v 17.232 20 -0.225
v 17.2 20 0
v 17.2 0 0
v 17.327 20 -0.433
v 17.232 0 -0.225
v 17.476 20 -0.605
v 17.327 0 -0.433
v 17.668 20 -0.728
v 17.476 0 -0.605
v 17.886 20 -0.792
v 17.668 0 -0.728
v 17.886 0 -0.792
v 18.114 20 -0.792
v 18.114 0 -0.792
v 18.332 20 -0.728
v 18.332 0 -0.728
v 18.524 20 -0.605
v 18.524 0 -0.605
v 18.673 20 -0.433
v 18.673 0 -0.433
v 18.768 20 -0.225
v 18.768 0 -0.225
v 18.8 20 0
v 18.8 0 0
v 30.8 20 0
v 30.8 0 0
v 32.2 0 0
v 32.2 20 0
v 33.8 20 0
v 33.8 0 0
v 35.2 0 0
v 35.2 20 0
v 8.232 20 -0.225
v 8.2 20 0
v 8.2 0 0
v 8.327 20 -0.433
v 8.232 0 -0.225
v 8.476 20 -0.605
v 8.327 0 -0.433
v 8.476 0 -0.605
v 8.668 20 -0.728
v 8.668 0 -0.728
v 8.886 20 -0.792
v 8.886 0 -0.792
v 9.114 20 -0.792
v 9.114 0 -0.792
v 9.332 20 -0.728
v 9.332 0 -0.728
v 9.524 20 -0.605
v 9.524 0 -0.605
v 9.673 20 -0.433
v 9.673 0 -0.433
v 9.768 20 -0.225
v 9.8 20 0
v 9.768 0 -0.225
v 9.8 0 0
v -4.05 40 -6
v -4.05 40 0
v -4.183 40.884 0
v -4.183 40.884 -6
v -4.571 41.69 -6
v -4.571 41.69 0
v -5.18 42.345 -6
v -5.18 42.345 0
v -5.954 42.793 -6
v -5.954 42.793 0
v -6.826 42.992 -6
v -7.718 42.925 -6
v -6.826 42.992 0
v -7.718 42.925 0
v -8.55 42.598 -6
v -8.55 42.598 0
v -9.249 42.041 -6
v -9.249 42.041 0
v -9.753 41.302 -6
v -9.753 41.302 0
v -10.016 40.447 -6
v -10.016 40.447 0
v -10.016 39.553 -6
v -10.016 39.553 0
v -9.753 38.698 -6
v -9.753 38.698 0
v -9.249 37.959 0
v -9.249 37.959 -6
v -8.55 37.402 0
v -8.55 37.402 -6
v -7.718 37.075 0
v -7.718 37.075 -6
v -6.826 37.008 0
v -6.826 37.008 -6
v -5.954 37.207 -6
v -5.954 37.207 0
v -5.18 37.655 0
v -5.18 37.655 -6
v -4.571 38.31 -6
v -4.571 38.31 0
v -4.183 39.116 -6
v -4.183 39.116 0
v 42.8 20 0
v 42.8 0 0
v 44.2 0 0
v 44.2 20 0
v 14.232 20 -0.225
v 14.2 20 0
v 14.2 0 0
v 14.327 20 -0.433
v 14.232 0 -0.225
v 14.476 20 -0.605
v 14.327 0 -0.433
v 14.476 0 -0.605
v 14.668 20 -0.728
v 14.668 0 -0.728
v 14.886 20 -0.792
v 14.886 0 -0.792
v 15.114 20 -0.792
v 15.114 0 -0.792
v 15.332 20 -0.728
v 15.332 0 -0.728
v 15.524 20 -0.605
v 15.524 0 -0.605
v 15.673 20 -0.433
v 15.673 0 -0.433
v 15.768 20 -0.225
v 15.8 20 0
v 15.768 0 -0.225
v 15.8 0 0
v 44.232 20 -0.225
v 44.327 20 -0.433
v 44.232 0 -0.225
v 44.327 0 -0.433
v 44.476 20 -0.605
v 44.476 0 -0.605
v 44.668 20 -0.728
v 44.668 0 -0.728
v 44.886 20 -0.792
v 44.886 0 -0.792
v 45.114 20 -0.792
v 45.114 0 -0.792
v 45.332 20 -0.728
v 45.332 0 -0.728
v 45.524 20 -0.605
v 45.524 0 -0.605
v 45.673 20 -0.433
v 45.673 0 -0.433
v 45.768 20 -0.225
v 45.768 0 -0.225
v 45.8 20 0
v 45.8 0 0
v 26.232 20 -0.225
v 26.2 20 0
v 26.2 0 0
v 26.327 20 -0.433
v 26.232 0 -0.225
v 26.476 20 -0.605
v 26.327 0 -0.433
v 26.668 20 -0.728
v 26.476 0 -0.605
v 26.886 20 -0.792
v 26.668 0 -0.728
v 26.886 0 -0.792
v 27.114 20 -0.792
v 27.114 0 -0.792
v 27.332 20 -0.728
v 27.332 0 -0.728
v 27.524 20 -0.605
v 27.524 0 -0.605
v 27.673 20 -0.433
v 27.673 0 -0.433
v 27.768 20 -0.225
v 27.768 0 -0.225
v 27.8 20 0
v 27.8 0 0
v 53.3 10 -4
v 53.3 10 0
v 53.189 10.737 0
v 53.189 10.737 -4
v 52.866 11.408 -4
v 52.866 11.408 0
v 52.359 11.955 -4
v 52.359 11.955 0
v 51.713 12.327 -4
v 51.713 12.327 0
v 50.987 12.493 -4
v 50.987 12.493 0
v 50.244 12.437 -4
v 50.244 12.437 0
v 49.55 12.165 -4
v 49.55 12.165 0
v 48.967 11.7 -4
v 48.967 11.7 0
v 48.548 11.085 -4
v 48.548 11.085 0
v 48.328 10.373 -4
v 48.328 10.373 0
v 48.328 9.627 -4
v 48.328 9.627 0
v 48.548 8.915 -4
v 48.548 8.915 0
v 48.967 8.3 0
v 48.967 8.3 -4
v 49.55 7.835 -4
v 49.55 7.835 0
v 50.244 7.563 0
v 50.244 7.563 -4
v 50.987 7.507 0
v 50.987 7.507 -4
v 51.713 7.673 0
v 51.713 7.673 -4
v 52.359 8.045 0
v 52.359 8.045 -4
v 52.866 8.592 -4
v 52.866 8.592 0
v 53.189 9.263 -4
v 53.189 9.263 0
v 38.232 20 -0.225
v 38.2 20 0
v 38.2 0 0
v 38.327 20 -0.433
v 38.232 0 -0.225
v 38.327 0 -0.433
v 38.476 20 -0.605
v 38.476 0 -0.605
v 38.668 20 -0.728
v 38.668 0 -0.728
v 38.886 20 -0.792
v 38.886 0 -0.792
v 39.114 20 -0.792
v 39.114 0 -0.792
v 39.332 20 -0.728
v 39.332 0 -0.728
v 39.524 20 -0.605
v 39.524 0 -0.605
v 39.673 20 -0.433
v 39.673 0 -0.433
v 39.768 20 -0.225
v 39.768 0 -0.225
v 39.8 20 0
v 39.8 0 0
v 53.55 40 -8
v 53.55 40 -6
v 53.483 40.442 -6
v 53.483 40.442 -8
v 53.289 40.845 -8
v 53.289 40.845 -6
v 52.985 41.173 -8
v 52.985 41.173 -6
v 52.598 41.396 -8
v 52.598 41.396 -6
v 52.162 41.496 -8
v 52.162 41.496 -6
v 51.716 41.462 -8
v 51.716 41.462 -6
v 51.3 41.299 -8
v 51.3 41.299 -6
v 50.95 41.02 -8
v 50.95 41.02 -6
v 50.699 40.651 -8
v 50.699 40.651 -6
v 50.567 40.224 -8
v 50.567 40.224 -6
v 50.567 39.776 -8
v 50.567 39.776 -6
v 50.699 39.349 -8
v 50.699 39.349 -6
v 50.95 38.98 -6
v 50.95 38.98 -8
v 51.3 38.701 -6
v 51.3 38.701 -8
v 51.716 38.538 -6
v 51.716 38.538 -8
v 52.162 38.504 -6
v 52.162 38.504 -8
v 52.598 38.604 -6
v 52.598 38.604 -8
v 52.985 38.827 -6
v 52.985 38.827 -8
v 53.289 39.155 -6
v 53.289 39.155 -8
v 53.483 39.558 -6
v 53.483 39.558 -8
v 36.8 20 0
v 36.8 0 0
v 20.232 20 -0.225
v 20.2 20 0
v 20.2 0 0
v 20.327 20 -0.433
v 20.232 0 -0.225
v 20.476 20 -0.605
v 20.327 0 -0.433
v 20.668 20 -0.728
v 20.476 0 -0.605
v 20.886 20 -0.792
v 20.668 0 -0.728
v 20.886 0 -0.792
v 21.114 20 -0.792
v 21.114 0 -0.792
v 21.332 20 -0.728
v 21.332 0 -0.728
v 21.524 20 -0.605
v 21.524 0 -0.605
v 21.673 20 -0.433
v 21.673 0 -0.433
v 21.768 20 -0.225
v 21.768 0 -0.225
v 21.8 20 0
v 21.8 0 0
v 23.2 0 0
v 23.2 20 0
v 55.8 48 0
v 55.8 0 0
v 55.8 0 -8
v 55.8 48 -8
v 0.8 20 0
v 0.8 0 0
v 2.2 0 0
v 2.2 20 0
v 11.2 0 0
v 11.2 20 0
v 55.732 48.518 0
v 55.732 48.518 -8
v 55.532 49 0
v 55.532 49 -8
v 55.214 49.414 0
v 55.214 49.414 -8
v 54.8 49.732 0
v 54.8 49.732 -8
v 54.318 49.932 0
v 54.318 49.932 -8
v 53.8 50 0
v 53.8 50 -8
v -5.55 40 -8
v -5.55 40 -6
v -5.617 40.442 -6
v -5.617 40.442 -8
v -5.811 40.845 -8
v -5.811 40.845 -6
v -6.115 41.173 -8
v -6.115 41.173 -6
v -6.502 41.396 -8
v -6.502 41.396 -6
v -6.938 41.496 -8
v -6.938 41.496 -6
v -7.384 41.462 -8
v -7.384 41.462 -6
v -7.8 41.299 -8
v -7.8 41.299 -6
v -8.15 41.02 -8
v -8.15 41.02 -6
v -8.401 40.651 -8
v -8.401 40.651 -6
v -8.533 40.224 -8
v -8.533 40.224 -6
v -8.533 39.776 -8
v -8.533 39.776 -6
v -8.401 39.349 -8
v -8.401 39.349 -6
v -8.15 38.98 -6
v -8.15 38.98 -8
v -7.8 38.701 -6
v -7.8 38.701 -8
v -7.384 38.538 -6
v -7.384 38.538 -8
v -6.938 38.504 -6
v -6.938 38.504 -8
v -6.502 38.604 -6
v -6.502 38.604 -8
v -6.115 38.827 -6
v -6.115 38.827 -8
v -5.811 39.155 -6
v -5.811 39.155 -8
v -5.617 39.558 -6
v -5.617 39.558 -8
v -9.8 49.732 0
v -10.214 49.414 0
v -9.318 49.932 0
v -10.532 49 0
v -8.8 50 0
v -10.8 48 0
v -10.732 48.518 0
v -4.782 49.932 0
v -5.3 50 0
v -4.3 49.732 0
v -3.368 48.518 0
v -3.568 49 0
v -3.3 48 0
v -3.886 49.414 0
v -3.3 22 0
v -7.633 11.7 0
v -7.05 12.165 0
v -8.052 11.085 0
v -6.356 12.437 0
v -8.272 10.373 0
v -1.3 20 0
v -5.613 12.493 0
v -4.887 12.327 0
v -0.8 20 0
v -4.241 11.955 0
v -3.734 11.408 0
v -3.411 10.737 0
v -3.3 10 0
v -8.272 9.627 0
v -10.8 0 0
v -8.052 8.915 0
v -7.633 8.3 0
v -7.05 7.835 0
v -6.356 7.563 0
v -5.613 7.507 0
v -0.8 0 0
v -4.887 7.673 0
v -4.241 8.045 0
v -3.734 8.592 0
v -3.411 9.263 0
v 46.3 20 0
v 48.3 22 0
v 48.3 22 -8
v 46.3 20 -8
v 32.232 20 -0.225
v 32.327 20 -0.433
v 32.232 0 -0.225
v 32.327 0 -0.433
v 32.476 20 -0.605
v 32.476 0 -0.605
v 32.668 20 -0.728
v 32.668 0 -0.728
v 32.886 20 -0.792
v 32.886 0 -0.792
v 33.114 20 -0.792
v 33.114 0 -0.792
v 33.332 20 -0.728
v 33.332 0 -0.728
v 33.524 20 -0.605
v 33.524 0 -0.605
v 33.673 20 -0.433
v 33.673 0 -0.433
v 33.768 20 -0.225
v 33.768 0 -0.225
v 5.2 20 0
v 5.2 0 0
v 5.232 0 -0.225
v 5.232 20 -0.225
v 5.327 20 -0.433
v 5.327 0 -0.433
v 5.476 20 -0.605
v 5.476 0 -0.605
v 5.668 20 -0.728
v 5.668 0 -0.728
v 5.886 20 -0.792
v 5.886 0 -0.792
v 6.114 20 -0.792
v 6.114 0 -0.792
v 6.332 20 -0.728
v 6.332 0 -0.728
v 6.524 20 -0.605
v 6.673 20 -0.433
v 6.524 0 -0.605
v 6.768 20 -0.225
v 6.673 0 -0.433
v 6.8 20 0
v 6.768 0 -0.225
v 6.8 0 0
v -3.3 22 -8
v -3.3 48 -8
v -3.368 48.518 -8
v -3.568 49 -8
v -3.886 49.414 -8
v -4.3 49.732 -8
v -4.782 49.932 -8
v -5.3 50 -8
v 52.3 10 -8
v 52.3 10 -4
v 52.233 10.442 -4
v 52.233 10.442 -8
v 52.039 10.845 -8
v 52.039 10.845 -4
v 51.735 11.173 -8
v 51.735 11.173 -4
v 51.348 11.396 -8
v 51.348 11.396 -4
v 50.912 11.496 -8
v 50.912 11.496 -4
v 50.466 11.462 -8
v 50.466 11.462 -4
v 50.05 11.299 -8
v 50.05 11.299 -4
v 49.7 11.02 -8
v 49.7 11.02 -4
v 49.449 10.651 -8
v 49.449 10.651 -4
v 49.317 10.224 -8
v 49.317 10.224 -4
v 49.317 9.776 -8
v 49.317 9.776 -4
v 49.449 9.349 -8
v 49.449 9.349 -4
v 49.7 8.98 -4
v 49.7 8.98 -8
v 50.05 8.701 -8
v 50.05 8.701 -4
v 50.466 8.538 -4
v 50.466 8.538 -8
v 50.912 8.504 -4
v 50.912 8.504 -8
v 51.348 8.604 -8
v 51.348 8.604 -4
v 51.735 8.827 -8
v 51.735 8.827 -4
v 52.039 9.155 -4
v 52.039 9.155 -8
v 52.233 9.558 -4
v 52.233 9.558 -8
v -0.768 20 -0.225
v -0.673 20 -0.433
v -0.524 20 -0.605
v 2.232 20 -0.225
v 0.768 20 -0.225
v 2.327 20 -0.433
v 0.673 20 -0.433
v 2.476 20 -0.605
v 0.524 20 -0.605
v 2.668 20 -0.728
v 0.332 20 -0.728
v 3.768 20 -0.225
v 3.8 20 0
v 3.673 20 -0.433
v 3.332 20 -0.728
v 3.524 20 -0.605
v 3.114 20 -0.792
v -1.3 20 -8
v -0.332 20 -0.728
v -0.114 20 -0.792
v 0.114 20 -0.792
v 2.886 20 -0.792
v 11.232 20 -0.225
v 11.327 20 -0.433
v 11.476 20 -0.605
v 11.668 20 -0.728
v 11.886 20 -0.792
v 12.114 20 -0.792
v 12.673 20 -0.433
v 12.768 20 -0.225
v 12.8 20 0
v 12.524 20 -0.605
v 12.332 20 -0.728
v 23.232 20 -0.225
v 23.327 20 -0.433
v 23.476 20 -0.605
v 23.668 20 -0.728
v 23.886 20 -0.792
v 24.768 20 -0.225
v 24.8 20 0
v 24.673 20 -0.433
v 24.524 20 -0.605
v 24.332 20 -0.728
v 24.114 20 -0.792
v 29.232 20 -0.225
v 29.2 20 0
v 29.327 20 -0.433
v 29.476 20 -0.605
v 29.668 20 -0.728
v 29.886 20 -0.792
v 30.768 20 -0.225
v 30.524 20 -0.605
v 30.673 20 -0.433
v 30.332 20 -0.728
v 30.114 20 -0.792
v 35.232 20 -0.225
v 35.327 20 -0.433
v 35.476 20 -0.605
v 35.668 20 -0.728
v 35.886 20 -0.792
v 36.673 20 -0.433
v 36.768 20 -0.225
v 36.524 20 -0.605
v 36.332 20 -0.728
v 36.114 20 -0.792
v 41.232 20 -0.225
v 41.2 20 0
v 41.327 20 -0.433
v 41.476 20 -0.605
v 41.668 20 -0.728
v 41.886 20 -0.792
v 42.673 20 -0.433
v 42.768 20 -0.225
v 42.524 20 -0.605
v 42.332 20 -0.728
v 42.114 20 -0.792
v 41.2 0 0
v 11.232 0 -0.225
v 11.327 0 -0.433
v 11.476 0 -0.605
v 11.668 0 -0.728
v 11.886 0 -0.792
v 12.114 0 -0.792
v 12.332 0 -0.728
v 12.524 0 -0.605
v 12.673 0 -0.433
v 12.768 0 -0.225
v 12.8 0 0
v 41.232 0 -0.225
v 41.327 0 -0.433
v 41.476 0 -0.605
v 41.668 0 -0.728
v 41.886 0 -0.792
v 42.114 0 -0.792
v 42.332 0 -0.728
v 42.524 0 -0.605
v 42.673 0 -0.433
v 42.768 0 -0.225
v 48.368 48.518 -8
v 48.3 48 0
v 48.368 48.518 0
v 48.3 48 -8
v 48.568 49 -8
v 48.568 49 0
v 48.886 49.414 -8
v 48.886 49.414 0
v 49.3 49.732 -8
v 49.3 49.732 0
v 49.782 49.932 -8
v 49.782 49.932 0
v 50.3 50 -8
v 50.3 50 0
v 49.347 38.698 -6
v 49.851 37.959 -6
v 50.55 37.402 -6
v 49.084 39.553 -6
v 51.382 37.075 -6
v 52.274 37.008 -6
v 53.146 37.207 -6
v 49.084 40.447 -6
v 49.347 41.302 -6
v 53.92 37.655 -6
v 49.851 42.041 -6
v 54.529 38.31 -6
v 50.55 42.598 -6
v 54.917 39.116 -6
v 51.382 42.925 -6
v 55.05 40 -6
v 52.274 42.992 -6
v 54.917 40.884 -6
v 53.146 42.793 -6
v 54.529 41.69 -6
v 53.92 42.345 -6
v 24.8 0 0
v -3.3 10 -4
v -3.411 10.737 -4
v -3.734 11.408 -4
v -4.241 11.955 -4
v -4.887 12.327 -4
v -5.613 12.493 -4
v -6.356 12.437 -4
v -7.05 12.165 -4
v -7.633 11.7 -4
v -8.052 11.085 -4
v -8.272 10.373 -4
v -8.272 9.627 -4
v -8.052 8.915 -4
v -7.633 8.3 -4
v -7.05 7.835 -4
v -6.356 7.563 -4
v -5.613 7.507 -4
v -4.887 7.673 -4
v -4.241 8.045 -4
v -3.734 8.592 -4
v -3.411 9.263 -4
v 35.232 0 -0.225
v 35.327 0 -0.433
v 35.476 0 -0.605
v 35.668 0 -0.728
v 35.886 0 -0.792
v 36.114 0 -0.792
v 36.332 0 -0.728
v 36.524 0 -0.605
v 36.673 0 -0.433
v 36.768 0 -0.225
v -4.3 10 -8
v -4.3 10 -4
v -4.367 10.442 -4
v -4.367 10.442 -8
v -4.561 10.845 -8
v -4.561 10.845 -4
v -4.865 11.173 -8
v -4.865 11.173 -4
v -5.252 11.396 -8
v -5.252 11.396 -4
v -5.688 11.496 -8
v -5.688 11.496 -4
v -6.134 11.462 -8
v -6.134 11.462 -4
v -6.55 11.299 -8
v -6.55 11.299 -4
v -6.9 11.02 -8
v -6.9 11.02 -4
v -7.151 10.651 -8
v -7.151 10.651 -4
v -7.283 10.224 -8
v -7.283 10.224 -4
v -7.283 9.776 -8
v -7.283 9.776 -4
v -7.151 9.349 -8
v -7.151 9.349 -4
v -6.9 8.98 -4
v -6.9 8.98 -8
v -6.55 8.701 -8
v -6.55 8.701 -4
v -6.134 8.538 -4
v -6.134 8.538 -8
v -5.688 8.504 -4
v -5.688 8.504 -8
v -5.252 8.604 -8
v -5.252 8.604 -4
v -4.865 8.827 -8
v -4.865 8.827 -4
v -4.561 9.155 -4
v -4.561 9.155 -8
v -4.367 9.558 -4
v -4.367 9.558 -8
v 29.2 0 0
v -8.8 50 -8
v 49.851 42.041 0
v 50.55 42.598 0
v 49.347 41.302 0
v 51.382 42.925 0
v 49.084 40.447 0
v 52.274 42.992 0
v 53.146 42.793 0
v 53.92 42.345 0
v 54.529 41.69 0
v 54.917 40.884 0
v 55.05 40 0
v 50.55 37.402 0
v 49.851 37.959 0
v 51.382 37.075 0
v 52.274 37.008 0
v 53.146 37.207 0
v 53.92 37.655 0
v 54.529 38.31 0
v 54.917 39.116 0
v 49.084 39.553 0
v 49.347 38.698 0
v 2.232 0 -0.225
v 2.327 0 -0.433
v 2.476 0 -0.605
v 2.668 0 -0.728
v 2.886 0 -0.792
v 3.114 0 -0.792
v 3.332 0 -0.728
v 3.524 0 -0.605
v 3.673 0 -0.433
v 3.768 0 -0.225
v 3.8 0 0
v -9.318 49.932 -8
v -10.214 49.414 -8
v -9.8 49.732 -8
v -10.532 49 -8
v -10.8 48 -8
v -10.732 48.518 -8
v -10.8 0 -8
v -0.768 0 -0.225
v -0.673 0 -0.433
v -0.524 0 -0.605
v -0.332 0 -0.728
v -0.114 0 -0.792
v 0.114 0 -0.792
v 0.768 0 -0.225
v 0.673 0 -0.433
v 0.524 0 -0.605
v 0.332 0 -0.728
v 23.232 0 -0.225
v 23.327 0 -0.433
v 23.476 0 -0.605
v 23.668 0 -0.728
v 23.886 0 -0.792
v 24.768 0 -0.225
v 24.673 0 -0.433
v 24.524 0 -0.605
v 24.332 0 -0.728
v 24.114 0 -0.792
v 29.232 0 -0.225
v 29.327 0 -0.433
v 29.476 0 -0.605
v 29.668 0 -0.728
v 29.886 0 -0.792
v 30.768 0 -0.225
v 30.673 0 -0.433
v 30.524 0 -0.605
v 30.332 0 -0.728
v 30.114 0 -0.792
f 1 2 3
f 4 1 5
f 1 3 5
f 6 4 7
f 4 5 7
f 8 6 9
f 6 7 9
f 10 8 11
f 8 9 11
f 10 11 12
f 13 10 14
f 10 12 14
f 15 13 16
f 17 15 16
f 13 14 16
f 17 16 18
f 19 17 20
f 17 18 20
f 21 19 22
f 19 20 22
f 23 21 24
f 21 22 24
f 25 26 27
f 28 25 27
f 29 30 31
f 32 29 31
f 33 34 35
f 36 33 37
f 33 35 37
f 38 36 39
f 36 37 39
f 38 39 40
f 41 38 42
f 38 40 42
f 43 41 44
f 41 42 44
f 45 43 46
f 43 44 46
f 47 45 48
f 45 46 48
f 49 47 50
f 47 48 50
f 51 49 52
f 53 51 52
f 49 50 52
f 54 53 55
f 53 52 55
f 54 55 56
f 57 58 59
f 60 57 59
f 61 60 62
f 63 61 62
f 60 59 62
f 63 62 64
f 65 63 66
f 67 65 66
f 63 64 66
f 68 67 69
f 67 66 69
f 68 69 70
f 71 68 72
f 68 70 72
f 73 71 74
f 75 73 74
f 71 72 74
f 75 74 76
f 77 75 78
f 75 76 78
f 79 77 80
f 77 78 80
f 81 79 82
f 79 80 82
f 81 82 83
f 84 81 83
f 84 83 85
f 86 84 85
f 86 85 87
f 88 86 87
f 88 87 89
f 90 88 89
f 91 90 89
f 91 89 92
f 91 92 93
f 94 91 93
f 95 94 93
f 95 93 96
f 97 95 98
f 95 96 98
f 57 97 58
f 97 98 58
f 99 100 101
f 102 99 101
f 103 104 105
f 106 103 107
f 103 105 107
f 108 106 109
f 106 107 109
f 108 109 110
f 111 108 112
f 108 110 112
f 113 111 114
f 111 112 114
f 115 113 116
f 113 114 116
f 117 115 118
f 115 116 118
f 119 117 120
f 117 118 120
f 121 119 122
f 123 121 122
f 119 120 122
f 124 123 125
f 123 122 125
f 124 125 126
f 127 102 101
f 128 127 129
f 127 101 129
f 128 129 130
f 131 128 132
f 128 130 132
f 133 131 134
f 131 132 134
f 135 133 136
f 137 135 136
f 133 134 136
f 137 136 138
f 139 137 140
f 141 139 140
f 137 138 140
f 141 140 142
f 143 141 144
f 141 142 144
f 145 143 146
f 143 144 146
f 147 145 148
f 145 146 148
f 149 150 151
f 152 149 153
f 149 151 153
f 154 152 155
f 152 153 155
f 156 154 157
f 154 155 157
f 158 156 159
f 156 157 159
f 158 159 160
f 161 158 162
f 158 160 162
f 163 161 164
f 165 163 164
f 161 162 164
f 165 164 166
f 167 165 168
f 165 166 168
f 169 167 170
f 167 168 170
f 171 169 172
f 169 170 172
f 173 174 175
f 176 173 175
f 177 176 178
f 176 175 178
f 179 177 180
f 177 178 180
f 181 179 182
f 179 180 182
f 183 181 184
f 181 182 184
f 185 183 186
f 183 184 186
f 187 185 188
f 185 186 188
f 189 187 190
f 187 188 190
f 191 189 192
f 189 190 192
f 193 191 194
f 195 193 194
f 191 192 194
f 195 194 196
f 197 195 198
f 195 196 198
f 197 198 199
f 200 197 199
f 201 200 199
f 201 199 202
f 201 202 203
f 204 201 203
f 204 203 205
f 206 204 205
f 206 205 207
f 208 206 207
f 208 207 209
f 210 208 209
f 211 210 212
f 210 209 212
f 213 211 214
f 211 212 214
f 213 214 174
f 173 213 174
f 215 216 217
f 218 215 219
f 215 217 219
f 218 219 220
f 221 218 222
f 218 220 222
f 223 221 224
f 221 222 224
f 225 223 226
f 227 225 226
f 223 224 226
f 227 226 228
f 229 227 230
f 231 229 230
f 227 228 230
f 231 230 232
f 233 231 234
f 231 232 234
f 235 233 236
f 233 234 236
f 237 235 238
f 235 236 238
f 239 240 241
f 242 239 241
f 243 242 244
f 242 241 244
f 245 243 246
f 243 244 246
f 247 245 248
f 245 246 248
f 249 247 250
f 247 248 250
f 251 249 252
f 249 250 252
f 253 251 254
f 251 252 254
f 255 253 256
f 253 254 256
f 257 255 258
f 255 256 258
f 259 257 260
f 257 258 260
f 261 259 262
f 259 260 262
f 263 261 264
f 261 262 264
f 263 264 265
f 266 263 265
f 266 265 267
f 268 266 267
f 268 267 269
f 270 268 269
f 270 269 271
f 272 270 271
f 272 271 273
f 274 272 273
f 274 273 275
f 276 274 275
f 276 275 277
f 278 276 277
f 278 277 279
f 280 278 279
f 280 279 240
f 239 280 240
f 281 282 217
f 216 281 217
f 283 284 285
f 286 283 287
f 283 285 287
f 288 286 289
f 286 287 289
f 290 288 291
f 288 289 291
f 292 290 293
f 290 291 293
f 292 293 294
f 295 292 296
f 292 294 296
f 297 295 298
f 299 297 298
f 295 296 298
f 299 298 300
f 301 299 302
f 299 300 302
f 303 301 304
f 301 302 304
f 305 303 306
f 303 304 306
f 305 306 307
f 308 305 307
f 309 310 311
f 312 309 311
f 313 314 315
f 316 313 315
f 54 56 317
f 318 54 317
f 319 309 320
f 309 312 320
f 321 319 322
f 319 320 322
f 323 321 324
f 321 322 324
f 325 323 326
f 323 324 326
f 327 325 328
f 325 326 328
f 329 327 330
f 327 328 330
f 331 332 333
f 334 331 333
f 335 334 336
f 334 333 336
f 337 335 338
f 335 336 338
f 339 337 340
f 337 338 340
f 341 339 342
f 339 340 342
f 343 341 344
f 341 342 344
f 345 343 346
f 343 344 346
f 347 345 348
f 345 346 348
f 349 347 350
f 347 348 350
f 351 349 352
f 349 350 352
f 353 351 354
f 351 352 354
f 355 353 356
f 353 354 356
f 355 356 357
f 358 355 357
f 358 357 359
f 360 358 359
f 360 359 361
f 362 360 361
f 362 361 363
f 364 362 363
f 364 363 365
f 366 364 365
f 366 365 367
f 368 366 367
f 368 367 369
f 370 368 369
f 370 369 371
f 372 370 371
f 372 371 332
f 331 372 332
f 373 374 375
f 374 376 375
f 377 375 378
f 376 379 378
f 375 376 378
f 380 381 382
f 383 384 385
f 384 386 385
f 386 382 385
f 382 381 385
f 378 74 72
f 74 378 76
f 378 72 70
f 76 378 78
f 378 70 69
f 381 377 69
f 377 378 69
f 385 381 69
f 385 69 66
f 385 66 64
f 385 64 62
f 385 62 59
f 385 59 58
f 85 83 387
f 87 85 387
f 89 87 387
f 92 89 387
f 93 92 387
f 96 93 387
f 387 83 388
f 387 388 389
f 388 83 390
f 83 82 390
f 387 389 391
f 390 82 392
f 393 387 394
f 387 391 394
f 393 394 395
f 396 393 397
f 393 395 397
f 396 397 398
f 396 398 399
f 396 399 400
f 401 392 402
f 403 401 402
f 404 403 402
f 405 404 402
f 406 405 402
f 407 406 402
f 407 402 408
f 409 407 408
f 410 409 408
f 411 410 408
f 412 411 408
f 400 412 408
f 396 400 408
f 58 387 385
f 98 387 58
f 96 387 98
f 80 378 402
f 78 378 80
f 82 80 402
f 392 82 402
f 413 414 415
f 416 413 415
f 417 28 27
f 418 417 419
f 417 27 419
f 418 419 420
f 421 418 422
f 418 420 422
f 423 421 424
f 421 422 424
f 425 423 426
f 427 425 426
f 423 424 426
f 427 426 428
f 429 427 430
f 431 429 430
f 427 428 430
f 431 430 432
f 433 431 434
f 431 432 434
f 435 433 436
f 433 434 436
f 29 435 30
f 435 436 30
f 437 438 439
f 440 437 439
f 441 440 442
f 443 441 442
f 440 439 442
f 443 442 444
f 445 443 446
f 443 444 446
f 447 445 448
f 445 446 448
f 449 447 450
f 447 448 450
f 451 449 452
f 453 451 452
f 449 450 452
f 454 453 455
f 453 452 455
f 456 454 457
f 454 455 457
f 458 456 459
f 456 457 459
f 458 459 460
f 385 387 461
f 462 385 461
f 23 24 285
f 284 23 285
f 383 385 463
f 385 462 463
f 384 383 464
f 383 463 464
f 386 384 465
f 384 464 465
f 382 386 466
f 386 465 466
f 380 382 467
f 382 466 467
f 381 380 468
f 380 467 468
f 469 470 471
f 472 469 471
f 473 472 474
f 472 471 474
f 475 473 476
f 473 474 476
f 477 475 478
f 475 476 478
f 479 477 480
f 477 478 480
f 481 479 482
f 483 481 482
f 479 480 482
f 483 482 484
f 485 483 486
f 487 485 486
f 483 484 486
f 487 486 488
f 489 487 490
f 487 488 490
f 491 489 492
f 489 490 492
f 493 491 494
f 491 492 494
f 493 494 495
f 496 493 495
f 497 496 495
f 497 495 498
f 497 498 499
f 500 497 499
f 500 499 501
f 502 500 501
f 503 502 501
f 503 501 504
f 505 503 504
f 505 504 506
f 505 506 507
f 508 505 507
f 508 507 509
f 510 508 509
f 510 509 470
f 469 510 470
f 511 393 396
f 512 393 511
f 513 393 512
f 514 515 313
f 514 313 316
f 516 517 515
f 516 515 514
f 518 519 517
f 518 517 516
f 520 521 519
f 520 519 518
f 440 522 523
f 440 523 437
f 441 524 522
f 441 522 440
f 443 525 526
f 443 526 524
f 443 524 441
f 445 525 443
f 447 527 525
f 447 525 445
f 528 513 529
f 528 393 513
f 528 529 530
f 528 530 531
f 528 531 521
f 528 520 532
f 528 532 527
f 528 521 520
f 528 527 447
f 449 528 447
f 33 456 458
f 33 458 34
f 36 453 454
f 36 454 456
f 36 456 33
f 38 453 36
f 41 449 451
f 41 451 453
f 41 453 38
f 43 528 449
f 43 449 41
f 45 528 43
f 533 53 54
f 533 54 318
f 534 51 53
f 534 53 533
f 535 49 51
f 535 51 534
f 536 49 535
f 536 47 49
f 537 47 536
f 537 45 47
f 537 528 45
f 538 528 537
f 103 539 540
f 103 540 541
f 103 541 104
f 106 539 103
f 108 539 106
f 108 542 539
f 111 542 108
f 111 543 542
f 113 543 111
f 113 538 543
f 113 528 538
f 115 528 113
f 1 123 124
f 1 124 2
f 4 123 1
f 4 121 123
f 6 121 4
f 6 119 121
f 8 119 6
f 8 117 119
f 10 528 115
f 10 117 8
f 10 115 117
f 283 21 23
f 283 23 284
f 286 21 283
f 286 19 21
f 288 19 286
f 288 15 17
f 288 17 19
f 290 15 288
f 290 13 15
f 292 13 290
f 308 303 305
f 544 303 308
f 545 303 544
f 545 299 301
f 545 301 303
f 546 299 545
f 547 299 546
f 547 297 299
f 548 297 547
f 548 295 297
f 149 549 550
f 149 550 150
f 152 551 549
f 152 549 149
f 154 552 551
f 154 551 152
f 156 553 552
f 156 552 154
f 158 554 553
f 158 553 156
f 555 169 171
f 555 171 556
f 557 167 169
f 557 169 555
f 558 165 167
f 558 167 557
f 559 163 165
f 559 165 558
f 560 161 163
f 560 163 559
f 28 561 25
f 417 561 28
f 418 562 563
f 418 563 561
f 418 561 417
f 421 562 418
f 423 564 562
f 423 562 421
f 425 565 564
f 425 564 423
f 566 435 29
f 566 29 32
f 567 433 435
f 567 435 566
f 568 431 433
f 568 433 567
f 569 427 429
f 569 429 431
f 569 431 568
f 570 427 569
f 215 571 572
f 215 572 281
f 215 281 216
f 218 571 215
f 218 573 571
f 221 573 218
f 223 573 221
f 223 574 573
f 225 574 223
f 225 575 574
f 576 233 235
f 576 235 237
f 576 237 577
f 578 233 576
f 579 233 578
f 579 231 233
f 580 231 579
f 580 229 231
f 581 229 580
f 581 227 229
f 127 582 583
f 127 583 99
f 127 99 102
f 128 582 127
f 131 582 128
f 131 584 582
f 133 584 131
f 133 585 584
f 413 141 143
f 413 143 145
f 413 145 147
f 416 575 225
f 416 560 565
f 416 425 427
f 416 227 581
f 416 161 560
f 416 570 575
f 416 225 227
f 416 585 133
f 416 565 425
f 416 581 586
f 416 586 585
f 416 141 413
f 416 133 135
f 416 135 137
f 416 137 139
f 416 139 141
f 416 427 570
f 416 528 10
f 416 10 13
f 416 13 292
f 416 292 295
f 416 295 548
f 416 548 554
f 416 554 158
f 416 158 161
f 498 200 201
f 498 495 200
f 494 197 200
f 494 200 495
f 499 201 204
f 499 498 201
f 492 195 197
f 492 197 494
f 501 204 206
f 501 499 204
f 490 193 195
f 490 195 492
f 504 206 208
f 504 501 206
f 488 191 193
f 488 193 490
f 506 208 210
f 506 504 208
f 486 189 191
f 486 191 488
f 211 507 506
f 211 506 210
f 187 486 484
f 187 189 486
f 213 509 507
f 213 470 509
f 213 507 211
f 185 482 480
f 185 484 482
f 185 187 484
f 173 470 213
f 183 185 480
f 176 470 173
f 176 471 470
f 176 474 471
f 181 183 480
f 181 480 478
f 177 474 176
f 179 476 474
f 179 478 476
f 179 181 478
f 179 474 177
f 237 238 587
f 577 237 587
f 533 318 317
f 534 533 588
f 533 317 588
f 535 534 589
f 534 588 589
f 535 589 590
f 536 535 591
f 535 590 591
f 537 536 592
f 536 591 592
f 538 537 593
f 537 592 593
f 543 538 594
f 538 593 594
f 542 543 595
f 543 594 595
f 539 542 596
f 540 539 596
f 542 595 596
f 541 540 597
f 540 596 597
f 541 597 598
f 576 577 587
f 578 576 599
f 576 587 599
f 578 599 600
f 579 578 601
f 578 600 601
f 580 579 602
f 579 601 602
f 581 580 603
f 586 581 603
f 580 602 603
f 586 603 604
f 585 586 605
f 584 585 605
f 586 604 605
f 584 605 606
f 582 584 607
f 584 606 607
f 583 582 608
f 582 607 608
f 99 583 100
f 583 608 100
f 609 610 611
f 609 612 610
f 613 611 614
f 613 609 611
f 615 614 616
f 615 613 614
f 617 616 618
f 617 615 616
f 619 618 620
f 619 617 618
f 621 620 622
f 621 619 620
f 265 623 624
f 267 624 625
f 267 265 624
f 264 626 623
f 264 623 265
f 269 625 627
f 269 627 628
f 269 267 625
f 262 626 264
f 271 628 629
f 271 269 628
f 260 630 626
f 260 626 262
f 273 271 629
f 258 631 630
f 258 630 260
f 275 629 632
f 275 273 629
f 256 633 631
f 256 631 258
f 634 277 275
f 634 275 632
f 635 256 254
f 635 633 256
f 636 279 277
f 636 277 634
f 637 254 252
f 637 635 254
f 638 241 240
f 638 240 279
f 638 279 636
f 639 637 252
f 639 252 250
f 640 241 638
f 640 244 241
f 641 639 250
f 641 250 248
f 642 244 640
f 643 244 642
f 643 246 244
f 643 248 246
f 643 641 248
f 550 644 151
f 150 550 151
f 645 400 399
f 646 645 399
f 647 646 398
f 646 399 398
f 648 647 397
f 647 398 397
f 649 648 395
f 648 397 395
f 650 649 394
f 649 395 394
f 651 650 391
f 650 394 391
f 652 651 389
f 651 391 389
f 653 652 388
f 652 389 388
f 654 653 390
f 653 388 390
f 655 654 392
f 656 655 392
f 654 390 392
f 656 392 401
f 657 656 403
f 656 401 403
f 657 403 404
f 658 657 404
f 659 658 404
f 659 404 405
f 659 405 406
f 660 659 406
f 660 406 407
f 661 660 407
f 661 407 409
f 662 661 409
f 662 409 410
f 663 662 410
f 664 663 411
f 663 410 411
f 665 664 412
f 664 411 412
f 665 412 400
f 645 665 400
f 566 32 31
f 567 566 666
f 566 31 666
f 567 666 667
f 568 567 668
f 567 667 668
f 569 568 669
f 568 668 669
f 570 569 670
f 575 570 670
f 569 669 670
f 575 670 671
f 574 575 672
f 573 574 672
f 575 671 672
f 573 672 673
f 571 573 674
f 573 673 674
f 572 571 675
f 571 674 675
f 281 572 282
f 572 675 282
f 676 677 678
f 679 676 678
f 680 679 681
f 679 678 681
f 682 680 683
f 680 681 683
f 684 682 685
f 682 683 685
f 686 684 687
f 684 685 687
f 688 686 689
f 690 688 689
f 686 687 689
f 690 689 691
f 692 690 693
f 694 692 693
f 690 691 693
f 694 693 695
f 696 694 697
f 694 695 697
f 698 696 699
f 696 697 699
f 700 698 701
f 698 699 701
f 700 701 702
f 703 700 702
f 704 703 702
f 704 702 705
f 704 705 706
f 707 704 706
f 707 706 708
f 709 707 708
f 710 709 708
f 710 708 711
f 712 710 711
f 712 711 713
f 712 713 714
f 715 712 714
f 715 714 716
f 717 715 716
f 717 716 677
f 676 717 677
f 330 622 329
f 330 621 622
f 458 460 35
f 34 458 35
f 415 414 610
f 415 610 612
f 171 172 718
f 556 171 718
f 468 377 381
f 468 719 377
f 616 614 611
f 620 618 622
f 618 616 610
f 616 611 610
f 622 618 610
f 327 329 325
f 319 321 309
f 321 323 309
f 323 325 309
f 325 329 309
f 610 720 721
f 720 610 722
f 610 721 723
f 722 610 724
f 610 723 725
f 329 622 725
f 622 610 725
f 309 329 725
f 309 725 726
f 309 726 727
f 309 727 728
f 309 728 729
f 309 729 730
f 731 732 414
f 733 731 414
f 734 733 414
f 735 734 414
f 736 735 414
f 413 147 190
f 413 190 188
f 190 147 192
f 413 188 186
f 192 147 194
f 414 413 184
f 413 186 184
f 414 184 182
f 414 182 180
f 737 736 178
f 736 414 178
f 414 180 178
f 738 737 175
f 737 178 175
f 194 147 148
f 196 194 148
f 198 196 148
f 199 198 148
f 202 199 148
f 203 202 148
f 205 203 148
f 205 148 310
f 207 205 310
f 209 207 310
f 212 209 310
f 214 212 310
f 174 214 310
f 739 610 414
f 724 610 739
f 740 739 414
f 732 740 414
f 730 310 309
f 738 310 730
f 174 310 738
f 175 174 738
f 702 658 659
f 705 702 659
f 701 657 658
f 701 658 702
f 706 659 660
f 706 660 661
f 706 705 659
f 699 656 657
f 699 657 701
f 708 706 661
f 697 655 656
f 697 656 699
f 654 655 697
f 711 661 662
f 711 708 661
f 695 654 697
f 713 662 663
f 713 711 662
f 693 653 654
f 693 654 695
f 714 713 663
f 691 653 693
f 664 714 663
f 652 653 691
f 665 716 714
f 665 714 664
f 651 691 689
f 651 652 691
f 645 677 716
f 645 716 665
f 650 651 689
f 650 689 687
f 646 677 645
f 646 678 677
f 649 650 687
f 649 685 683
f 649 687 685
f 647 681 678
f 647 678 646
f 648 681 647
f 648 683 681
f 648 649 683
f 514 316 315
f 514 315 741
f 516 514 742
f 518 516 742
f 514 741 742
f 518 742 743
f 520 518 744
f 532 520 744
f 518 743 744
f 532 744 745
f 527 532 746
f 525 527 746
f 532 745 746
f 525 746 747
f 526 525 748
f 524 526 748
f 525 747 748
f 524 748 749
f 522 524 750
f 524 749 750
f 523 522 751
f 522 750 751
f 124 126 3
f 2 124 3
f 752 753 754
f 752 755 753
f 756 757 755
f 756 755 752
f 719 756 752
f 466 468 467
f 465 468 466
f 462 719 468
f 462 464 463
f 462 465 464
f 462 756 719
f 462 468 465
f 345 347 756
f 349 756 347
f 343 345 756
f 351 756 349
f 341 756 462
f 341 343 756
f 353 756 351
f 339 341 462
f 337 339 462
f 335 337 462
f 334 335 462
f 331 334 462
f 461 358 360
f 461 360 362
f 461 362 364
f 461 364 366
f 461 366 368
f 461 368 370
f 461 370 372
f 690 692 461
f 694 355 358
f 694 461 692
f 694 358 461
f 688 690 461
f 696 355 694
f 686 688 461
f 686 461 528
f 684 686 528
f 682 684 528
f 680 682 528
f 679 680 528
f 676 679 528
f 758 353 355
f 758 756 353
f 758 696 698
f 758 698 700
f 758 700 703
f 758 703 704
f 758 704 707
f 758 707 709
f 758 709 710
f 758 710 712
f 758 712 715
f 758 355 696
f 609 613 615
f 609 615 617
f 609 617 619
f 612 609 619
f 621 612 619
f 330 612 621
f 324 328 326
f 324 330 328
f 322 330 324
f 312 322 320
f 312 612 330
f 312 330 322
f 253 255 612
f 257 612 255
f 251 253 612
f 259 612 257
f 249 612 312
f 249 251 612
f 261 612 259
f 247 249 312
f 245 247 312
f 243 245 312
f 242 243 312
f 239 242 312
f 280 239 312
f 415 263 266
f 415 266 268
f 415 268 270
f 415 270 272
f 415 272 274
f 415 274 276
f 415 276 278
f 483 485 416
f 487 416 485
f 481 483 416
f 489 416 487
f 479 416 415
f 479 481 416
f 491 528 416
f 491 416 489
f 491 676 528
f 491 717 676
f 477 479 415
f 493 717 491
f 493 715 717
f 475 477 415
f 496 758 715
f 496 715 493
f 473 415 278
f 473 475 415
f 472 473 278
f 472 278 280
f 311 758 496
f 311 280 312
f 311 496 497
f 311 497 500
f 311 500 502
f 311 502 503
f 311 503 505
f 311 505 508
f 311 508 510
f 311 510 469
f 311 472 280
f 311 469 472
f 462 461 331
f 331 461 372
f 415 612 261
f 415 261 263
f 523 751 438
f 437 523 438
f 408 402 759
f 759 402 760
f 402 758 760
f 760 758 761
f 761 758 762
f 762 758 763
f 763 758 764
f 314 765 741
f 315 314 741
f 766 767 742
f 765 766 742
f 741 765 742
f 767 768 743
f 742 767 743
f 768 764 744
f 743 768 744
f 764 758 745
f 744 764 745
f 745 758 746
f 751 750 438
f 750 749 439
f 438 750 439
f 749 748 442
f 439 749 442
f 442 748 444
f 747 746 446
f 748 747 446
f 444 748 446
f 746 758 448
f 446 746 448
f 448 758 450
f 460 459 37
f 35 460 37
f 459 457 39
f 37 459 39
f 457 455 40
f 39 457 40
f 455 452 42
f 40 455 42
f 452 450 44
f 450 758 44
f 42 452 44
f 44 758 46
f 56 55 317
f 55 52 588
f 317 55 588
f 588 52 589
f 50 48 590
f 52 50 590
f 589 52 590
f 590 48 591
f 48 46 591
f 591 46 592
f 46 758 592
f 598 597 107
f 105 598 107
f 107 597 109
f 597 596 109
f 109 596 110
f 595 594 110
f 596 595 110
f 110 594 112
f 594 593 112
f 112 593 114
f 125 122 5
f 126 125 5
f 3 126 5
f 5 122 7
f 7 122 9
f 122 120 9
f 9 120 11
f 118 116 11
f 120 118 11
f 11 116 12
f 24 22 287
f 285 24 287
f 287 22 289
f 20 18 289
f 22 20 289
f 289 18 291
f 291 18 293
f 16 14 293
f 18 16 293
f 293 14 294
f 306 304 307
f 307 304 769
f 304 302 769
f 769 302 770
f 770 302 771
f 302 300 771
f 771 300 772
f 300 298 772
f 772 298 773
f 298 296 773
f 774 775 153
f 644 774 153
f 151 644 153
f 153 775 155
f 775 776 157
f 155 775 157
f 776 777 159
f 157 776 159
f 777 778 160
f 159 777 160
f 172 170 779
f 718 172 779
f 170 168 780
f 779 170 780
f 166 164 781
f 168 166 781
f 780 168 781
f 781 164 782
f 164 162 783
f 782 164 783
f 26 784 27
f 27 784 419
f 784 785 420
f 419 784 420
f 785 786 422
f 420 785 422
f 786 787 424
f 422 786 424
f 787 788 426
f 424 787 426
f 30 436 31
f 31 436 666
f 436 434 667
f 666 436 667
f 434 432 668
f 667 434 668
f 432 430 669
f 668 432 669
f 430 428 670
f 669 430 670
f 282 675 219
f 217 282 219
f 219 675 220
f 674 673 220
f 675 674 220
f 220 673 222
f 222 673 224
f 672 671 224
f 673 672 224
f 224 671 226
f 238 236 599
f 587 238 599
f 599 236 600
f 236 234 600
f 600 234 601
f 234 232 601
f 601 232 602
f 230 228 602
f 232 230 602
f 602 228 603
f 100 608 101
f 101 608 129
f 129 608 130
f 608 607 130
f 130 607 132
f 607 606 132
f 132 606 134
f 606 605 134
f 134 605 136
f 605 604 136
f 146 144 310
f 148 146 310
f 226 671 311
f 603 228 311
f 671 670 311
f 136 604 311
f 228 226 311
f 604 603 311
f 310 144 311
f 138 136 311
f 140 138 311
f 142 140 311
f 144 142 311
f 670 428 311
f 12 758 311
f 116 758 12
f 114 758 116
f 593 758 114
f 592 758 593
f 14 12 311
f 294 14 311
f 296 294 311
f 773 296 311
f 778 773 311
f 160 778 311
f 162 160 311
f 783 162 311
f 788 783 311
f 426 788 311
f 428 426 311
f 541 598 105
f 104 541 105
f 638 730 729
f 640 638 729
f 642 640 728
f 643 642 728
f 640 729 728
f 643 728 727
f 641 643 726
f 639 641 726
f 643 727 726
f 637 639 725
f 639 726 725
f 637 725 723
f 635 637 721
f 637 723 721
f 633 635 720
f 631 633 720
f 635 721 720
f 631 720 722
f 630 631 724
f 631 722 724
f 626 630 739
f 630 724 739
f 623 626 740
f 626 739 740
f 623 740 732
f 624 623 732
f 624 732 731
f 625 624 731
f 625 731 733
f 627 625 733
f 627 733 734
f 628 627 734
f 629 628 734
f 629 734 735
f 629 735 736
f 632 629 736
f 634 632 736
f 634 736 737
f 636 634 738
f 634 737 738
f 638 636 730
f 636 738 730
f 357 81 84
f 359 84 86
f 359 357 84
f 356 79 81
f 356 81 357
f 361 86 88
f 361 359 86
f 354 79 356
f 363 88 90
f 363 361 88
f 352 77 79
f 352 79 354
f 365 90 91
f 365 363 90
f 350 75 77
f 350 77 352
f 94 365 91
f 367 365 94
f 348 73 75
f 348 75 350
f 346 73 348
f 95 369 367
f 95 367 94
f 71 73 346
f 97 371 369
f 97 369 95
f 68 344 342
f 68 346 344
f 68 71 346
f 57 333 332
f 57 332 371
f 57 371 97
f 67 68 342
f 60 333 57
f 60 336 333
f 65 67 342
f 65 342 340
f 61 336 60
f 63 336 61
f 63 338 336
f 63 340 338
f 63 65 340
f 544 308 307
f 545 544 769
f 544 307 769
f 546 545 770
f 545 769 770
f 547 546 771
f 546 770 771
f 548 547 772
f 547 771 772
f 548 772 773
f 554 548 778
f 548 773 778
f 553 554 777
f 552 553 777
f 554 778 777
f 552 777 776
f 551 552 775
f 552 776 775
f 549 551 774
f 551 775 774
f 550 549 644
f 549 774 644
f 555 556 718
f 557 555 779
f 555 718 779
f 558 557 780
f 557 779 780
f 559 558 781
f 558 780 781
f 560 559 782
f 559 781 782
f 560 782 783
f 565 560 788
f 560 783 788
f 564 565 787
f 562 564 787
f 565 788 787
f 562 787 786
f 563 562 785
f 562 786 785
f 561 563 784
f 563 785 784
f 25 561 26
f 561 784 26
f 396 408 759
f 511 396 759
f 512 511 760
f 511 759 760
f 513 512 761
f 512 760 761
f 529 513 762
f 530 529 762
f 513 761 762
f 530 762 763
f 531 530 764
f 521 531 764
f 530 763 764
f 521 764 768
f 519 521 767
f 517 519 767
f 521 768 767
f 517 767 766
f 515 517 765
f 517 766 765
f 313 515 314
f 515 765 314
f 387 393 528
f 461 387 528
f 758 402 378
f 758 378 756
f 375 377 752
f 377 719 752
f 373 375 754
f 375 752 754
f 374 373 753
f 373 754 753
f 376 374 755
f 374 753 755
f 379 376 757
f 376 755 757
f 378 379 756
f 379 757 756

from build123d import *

# Parameters (mm, degrees)
EXTRUDE_1_DEPTH     = 20
SKETCH_3_R          = 2.5
CUT_EXTRUDE_1_DEPTH = 4
SKETCH_4_R          = 1.5
CUT_EXTRUDE_2_DEPTH = 14
SKETCH_5_W          = 7.5
SKETCH_5_H          = 8
EXTRUDE_2_DEPTH     = 30
SKETCH_6_R          = 3
CUT_EXTRUDE_3_DEPTH = 6
SKETCH_7_R          = 1.5
CUT_EXTRUDE_4_DEPTH = 6
CHAMFER_1_SIZE      = 2
FILLET_1_R          = 2


with BuildPart() as part:
    # 草图1 → 凸台-拉伸1 (new body)
    with BuildSketch(Plane(origin=(0, 0, 0), x_dir=(1, 0, 0), z_dir=(0, 1, 0))):
        with BuildLine():
            Line((-10.8, 0), (-0.8, 0))
            ThreePointArc((-0.8, 0), (0, 0.8), (0.8, 0))
            Line((0.8, 0), (2.2, 0))
            ThreePointArc((2.2, 0), (3, 0.8), (3.8, 0))
            Line((3.8, 0), (5.2, 0))
            ThreePointArc((5.2, 0), (6, 0.8), (6.8, 0))
            Line((6.8, 0), (8.2, 0))
            ThreePointArc((8.2, 0), (9, 0.8), (9.8, 0))
            Line((9.8, 0), (11.2, 0))
            ThreePointArc((11.2, 0), (12, 0.8), (12.8, 0))
            Line((12.8, 0), (14.2, 0))
            ThreePointArc((14.2, 0), (15, 0.8), (15.8, 0))
            Line((15.8, 0), (17.2, 0))
            ThreePointArc((17.2, 0), (18, 0.8), (18.8, 0))
            Line((18.8, 0), (20.2, 0))
            ThreePointArc((20.2, 0), (21, 0.8), (21.8, 0))
            Line((21.8, 0), (23.2, 0))
            ThreePointArc((23.2, 0), (24, 0.8), (24.8, 0))
            Line((24.8, 0), (26.2, 0))
            ThreePointArc((26.2, 0), (27, 0.8), (27.8, 0))
            Line((27.8, 0), (29.2, 0))
            ThreePointArc((29.2, 0), (30, 0.8), (30.8, 0))
            Line((30.8, 0), (32.2, 0))
            ThreePointArc((32.2, 0), (33, 0.8), (33.8, 0))
            Line((33.8, 0), (35.2, 0))
            ThreePointArc((35.2, 0), (36, 0.8), (36.8, 0))
            Line((36.8, 0), (38.2, 0))
            ThreePointArc((38.2, 0), (39, 0.8), (39.8, 0))
            Line((39.8, 0), (41.2, 0))
            ThreePointArc((41.2, 0), (42, 0.8), (42.8, 0))
            Line((42.8, 0), (44.2, 0))
            ThreePointArc((44.2, 0), (45, 0.8), (45.8, 0))
            Line((45.8, 0), (55.8, 0))
            Line((55.8, 0), (55.8, 8))
            Line((55.8, 8), (-10.8, 8))
            Line((-10.8, 8), (-10.8, 0))
        make_face()
    extrude(amount=EXTRUDE_1_DEPTH)

    # 草图3 → 切除-拉伸1 (cut)
    with BuildSketch(Plane.XY):
        with Locations((50.8, 10)):
            Circle(SKETCH_3_R)
        with Locations((-5.8, 10)):
            Circle(SKETCH_3_R)
    extrude(amount=-CUT_EXTRUDE_1_DEPTH, mode=Mode.SUBTRACT)

    # 草图4 → 切除-拉伸2 (cut)
    with BuildSketch(Plane.XY.offset(-4)):
        with Locations((-5.8, 10)):
            Circle(SKETCH_4_R)
        with Locations((50.8, 10)):
            Circle(SKETCH_4_R)
    extrude(amount=-CUT_EXTRUDE_2_DEPTH, mode=Mode.SUBTRACT)

    # 草图5 → 凸台-拉伸2 (add)
    with BuildSketch(Plane(origin=(0, 20, 0), x_dir=(1, 0, 0), z_dir=(0, 1, 0))):
        with Locations((-7.05, 4)):
            Rectangle(SKETCH_5_W, SKETCH_5_H)
        with Locations((52.05, 4)):
            Rectangle(SKETCH_5_W, SKETCH_5_H)
    extrude(amount=EXTRUDE_2_DEPTH)

    # 草图6 → 切除-拉伸3 (cut)
    with BuildSketch(Plane.XY):
        with Locations((-7.05, 40)):
            Circle(SKETCH_6_R)
        with Locations((52.05, 40)):
            Circle(SKETCH_6_R)
    extrude(amount=-CUT_EXTRUDE_3_DEPTH, mode=Mode.SUBTRACT)

    # 草图7 → 切除-拉伸4 (cut)
    with BuildSketch(Plane.XY.offset(-6)):
        with Locations((-7.05, 40)):
            Circle(SKETCH_7_R)
        with Locations((52.05, 40)):
            Circle(SKETCH_7_R)
    extrude(amount=-CUT_EXTRUDE_4_DEPTH, mode=Mode.SUBTRACT)

    # 倒角1
    chamfer_1_edges = [part.edges().sort_by_distance(p)[0] for p in [
        (-3.3, 20, -4),
        (48.3, 20, -4),
    ]]
    chamfer(chamfer_1_edges, length=CHAMFER_1_SIZE)

    # 圆角1
    fillet_1_edges = [part.edges().sort_by_distance(p)[0] for p in [
        (-10.8, 50, -4),
        (-3.3, 50, -4),
        (55.8, 50, -4),
        (48.3, 50, -4),
    ]]
    fillet(fillet_1_edges, radius=FILLET_1_R)


solid = part.part
